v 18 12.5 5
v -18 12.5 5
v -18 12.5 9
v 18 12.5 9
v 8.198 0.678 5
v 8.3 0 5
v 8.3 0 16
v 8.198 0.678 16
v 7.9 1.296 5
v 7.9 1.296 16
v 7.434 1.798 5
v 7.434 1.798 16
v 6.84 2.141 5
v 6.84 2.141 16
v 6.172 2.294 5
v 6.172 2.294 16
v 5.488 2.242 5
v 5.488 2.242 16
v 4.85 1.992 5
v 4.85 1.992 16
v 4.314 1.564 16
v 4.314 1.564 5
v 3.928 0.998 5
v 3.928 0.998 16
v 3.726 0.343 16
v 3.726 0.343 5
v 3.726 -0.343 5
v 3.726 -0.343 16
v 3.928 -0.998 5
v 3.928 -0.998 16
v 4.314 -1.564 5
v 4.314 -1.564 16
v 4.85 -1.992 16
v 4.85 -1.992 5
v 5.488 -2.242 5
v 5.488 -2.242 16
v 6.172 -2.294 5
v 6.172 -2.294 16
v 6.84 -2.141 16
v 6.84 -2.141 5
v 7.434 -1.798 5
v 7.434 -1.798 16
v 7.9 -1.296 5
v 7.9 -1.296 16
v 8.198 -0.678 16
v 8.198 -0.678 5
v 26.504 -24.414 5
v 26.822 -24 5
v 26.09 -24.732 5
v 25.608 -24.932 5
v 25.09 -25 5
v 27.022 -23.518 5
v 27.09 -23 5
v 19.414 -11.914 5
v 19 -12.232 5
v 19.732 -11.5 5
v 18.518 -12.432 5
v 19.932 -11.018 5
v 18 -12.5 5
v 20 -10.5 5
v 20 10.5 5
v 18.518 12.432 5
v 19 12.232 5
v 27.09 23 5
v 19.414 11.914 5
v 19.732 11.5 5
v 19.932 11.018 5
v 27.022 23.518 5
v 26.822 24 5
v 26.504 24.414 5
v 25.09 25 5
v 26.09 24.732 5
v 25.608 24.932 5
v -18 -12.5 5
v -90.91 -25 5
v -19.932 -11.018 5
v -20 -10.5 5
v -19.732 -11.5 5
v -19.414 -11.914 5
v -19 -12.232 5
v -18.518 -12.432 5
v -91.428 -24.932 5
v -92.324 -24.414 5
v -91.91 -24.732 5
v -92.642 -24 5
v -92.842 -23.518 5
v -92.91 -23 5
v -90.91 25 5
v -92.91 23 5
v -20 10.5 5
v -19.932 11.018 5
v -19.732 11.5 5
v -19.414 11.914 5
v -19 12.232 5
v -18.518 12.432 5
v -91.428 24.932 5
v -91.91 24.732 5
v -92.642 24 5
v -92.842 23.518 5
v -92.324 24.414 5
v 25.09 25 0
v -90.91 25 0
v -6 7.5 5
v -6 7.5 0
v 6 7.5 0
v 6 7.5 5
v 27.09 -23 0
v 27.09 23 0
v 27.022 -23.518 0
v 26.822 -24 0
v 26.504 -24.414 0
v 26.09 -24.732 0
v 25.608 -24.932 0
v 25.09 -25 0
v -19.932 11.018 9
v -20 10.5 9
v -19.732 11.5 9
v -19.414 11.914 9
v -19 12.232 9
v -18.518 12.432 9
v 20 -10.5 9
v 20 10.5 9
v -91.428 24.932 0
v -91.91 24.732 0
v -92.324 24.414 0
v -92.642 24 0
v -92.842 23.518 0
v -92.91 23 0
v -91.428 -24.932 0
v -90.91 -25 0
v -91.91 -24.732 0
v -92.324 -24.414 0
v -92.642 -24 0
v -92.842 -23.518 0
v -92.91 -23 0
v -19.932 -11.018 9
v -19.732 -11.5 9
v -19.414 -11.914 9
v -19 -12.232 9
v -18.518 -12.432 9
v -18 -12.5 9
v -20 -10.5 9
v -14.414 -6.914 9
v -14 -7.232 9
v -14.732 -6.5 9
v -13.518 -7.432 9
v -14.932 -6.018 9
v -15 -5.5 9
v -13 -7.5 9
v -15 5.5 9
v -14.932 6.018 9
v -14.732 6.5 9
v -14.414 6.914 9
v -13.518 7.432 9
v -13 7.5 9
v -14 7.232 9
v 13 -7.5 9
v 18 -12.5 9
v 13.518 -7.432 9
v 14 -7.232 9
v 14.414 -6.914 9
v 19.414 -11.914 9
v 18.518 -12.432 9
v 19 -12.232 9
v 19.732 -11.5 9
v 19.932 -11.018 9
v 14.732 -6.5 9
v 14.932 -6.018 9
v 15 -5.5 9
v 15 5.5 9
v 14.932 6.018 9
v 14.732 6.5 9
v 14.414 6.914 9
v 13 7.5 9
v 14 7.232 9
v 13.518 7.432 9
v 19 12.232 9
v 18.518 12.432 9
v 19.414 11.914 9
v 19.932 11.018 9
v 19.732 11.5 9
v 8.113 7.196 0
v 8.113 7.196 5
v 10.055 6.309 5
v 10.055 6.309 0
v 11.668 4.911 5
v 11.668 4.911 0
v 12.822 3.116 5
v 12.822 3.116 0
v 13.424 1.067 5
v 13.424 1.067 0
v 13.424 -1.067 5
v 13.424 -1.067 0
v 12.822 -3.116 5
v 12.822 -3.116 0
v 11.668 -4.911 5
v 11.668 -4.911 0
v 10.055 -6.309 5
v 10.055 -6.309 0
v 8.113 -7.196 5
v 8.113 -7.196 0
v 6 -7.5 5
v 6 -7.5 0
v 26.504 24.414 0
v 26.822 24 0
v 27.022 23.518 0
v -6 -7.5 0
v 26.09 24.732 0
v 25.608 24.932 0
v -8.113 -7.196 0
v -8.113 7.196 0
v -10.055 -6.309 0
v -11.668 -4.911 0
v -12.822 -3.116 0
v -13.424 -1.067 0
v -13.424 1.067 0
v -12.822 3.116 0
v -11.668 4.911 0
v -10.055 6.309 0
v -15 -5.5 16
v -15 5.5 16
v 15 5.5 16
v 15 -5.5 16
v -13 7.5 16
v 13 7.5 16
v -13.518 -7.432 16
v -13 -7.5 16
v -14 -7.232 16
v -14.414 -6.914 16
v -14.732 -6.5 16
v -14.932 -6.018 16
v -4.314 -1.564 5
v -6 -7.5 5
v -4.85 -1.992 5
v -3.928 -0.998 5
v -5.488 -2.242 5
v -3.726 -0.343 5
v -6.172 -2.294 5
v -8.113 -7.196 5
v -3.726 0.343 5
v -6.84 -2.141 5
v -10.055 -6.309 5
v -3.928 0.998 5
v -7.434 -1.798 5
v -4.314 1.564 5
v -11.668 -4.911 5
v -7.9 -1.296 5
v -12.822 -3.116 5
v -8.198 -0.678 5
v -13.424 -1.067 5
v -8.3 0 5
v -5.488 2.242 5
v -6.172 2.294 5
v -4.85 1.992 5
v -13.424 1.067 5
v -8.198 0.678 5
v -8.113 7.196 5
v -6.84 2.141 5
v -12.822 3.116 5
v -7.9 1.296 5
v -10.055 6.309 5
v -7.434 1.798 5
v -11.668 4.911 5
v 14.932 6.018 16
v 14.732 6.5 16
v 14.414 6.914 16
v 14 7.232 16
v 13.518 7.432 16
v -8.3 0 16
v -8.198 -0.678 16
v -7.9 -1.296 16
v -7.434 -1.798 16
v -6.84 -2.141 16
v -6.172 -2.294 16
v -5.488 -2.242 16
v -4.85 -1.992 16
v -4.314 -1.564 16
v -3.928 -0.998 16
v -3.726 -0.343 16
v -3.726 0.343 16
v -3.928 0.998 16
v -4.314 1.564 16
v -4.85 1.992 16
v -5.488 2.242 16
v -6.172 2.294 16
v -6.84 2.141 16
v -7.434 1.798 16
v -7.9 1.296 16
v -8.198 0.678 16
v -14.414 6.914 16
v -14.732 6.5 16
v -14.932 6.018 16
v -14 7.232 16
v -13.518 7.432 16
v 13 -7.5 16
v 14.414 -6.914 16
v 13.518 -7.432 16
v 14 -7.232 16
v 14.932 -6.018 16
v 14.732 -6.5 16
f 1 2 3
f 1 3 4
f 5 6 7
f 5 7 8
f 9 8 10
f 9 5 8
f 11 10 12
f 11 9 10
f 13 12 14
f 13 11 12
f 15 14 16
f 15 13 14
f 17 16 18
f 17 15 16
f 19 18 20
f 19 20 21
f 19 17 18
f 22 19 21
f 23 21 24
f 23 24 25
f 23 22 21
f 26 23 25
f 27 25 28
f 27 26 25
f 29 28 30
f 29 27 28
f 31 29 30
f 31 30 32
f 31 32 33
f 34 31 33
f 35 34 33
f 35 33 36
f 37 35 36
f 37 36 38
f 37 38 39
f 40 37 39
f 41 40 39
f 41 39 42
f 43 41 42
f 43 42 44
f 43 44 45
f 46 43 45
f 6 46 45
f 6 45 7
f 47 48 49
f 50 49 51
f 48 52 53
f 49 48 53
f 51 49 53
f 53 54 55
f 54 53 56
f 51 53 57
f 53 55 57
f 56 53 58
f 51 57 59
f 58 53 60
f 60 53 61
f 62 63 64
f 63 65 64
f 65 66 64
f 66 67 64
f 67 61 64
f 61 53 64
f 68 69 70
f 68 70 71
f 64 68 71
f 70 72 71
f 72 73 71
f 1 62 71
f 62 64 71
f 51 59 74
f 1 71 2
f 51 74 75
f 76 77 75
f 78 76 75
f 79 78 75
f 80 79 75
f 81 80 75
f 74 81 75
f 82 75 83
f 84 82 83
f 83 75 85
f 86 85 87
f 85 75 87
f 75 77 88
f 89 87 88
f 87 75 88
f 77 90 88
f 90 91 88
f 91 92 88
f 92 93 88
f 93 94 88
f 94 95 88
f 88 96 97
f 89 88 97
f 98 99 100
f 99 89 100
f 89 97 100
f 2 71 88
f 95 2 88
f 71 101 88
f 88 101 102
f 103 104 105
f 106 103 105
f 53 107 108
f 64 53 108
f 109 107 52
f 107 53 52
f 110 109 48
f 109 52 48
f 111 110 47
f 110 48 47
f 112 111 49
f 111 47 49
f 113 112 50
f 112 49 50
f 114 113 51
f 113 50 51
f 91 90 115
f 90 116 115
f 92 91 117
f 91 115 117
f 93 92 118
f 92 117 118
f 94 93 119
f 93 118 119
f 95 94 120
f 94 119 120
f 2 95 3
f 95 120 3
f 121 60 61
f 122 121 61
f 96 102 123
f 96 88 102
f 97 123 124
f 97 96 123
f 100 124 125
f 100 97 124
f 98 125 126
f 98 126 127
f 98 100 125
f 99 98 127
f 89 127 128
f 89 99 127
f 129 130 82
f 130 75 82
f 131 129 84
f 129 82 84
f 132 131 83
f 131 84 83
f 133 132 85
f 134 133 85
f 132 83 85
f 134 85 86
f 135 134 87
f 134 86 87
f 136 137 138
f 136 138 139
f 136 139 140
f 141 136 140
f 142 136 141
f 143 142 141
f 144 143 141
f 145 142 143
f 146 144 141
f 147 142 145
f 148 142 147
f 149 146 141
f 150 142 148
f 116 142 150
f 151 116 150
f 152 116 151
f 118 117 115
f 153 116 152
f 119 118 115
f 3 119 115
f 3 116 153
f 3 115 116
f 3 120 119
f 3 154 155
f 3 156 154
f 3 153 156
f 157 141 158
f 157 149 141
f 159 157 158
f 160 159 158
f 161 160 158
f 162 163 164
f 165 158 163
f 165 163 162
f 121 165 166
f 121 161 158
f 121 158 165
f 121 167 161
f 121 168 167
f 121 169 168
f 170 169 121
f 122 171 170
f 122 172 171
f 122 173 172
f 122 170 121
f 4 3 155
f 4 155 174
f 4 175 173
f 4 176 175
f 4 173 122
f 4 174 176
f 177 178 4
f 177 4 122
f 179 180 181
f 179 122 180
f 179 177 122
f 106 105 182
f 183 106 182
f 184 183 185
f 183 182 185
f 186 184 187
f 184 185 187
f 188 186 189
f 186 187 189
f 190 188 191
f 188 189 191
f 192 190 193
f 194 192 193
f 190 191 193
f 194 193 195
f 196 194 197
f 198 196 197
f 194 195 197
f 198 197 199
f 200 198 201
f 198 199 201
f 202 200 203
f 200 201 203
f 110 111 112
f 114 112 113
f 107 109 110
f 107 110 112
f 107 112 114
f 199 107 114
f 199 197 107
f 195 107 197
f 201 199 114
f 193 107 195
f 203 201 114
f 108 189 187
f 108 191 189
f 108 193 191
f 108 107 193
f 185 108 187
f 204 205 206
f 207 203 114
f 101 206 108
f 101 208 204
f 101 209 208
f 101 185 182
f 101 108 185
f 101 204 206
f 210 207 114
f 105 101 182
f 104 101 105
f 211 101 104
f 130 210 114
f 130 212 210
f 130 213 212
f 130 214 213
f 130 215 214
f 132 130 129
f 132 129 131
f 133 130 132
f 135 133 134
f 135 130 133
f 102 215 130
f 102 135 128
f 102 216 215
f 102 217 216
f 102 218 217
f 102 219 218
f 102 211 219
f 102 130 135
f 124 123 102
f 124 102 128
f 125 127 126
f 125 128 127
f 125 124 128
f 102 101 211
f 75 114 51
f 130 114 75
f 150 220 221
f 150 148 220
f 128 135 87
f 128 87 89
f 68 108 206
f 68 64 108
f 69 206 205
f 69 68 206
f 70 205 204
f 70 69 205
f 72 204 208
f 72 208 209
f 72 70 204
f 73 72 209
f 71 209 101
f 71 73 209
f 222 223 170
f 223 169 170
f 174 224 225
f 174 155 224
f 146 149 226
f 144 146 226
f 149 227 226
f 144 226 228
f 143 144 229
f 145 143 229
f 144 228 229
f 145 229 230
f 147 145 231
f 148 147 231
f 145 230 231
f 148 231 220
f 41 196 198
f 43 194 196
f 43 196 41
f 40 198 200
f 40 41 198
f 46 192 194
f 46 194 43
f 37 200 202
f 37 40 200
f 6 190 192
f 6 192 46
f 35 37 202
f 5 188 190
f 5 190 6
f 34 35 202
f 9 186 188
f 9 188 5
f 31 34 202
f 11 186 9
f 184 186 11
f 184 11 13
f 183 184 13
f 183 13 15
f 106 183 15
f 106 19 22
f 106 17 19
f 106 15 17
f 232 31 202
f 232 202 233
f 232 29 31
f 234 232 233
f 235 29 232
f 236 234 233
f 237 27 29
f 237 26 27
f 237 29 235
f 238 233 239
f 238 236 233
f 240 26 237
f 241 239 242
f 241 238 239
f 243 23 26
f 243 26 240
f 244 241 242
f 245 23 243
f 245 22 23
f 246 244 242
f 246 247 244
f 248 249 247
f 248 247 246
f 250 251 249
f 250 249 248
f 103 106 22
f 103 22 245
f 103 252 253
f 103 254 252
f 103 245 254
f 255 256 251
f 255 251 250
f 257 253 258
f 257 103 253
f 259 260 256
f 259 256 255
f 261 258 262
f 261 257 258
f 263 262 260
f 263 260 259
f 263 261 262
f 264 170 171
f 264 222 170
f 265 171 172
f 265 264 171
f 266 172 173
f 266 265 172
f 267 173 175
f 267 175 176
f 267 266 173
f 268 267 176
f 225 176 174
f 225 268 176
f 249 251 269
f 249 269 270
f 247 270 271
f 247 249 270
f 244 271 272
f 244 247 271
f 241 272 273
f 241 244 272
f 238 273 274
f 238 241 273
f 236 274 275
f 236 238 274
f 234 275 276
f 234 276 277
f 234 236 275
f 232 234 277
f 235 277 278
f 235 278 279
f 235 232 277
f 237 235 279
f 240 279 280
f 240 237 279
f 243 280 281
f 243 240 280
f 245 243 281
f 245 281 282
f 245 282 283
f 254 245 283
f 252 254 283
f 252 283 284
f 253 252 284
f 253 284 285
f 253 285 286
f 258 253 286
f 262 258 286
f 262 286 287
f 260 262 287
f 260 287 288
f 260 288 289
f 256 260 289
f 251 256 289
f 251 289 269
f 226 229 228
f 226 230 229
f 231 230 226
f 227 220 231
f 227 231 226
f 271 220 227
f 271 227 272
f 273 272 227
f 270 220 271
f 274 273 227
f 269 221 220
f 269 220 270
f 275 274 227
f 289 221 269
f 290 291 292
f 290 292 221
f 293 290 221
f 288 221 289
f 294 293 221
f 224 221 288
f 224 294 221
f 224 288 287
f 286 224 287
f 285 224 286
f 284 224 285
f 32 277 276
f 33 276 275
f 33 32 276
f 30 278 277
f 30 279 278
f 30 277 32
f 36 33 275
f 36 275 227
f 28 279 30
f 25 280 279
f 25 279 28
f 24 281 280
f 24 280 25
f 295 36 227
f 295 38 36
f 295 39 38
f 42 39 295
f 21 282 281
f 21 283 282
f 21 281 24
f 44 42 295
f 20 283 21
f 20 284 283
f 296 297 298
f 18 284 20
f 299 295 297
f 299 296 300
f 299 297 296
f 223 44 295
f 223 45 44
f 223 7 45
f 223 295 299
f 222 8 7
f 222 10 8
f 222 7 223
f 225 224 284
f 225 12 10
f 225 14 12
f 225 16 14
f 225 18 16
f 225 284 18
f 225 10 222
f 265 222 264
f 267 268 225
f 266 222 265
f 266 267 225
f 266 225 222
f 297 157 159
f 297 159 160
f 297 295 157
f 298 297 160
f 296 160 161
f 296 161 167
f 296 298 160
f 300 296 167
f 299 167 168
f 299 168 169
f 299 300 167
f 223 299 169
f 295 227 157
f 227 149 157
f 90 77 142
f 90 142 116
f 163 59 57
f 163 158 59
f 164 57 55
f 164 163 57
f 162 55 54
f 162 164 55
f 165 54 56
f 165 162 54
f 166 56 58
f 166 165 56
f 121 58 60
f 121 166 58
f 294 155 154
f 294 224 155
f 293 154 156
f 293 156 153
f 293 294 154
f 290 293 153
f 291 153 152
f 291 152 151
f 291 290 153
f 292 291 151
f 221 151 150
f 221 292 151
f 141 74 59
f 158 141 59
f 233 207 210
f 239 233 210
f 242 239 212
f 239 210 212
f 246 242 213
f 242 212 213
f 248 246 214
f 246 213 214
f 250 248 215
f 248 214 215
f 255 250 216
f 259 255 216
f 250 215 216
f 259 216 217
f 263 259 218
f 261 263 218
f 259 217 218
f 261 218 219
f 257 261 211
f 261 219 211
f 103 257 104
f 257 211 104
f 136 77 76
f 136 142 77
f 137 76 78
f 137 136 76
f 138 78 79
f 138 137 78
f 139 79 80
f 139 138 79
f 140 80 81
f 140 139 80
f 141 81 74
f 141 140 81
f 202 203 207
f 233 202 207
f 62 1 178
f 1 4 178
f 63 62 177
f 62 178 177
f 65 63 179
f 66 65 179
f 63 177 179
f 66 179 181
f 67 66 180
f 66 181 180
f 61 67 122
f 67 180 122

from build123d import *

# Parameters (mm, degrees)
CROQUIS1_W              = 30
CROQUIS1_H              = 15
CROQUIS1_R              = 2.3
SALIENTE_EXTRUIR1_DEPTH = 16
CROQUIS2_W              = 120
CROQUIS2_H              = 50
CROQUIS2_R              = 3.5
SALIENTE_EXTRUIR2_DEPTH = 5
CROQUIS3_W              = 40
CROQUIS3_H              = 25
CROQUIS3_W_2            = 30
CROQUIS3_H_2            = 15
SALIENTE_EXTRUIR3_DEPTH = 4
CORTAR_EXTRUIR1_DEPTH   = 5
REDONDEO1_R             = 2


with BuildPart() as part:
    # Croquis1 → Saliente-Extruir1 (new body)
    with BuildSketch(Plane.XY):
        Rectangle(CROQUIS1_W, CROQUIS1_H)
        with Locations((6, 0)):
            Circle(CROQUIS1_R, mode=Mode.SUBTRACT)
        with Locations(Location((-6, 0, 0), (0, 0, 180))):
            Circle(CROQUIS1_R, mode=Mode.SUBTRACT)
    extrude(amount=SALIENTE_EXTRUIR1_DEPTH)

    # Croquis2 → Saliente-Extruir2 (add)
    with BuildSketch(Plane(origin=(0, 0, 0), x_dir=(-1, 0, 0), z_dir=(0, 0, -1))):
        with Locations((32.909933797, 0)):
            Rectangle(CROQUIS2_W, CROQUIS2_H)
        with Locations((-6, 0)):
            Circle(CROQUIS2_R, mode=Mode.SUBTRACT)
        with Locations((6, 0)):
            Circle(CROQUIS2_R, mode=Mode.SUBTRACT)
    extrude(amount=-SALIENTE_EXTRUIR2_DEPTH)

    # Croquis3 → Saliente-Extruir3 (add)
    with BuildSketch(Plane.XY.offset(5)):
        Rectangle(CROQUIS3_W, CROQUIS3_H)
        Rectangle(CROQUIS3_W_2, CROQUIS3_H_2, mode=Mode.SUBTRACT)
    extrude(amount=SALIENTE_EXTRUIR3_DEPTH)

    # Croquis4 → Cortar-Extruir1 (cut)
    with BuildSketch(Plane(origin=(0, 0, 0), x_dir=(-1, 0, 0), z_dir=(0, 0, -1))):
        with BuildLine():
            Line((6, 7.5), (-6, 7.5))
            ThreePointArc((-6, 7.5), (-13.5, 0), (-6, -7.5))
            Line((-6, -7.5), (6, -7.5))
            ThreePointArc((6, -7.5), (13.5, 0), (6, 7.5))
        make_face()
    extrude(amount=-CORTAR_EXTRUIR1_DEPTH, mode=Mode.SUBTRACT)

    # Redondeo1
    redondeo1_edges = [part.edges().sort_by_distance(p)[0] for p in [
        (27.090066203, -25, 2.5),
        (27.090066203, 25, 2.5),
        (-92.909933797, 25, 2.5),
        (-92.909933797, -25, 2.5),
        (20, -12.5, 7),
        (20, 12.5, 7),
        (-20, 12.5, 7),
        (-20, -12.5, 7),
        (15, -7.5, 12.5),
        (-15, -7.5, 12.5),
        (-15, 7.5, 12.5),
        (15, 7.5, 12.5),
    ]]
    fillet(redondeo1_edges, radius=REDONDEO1_R)


solid = part.part
